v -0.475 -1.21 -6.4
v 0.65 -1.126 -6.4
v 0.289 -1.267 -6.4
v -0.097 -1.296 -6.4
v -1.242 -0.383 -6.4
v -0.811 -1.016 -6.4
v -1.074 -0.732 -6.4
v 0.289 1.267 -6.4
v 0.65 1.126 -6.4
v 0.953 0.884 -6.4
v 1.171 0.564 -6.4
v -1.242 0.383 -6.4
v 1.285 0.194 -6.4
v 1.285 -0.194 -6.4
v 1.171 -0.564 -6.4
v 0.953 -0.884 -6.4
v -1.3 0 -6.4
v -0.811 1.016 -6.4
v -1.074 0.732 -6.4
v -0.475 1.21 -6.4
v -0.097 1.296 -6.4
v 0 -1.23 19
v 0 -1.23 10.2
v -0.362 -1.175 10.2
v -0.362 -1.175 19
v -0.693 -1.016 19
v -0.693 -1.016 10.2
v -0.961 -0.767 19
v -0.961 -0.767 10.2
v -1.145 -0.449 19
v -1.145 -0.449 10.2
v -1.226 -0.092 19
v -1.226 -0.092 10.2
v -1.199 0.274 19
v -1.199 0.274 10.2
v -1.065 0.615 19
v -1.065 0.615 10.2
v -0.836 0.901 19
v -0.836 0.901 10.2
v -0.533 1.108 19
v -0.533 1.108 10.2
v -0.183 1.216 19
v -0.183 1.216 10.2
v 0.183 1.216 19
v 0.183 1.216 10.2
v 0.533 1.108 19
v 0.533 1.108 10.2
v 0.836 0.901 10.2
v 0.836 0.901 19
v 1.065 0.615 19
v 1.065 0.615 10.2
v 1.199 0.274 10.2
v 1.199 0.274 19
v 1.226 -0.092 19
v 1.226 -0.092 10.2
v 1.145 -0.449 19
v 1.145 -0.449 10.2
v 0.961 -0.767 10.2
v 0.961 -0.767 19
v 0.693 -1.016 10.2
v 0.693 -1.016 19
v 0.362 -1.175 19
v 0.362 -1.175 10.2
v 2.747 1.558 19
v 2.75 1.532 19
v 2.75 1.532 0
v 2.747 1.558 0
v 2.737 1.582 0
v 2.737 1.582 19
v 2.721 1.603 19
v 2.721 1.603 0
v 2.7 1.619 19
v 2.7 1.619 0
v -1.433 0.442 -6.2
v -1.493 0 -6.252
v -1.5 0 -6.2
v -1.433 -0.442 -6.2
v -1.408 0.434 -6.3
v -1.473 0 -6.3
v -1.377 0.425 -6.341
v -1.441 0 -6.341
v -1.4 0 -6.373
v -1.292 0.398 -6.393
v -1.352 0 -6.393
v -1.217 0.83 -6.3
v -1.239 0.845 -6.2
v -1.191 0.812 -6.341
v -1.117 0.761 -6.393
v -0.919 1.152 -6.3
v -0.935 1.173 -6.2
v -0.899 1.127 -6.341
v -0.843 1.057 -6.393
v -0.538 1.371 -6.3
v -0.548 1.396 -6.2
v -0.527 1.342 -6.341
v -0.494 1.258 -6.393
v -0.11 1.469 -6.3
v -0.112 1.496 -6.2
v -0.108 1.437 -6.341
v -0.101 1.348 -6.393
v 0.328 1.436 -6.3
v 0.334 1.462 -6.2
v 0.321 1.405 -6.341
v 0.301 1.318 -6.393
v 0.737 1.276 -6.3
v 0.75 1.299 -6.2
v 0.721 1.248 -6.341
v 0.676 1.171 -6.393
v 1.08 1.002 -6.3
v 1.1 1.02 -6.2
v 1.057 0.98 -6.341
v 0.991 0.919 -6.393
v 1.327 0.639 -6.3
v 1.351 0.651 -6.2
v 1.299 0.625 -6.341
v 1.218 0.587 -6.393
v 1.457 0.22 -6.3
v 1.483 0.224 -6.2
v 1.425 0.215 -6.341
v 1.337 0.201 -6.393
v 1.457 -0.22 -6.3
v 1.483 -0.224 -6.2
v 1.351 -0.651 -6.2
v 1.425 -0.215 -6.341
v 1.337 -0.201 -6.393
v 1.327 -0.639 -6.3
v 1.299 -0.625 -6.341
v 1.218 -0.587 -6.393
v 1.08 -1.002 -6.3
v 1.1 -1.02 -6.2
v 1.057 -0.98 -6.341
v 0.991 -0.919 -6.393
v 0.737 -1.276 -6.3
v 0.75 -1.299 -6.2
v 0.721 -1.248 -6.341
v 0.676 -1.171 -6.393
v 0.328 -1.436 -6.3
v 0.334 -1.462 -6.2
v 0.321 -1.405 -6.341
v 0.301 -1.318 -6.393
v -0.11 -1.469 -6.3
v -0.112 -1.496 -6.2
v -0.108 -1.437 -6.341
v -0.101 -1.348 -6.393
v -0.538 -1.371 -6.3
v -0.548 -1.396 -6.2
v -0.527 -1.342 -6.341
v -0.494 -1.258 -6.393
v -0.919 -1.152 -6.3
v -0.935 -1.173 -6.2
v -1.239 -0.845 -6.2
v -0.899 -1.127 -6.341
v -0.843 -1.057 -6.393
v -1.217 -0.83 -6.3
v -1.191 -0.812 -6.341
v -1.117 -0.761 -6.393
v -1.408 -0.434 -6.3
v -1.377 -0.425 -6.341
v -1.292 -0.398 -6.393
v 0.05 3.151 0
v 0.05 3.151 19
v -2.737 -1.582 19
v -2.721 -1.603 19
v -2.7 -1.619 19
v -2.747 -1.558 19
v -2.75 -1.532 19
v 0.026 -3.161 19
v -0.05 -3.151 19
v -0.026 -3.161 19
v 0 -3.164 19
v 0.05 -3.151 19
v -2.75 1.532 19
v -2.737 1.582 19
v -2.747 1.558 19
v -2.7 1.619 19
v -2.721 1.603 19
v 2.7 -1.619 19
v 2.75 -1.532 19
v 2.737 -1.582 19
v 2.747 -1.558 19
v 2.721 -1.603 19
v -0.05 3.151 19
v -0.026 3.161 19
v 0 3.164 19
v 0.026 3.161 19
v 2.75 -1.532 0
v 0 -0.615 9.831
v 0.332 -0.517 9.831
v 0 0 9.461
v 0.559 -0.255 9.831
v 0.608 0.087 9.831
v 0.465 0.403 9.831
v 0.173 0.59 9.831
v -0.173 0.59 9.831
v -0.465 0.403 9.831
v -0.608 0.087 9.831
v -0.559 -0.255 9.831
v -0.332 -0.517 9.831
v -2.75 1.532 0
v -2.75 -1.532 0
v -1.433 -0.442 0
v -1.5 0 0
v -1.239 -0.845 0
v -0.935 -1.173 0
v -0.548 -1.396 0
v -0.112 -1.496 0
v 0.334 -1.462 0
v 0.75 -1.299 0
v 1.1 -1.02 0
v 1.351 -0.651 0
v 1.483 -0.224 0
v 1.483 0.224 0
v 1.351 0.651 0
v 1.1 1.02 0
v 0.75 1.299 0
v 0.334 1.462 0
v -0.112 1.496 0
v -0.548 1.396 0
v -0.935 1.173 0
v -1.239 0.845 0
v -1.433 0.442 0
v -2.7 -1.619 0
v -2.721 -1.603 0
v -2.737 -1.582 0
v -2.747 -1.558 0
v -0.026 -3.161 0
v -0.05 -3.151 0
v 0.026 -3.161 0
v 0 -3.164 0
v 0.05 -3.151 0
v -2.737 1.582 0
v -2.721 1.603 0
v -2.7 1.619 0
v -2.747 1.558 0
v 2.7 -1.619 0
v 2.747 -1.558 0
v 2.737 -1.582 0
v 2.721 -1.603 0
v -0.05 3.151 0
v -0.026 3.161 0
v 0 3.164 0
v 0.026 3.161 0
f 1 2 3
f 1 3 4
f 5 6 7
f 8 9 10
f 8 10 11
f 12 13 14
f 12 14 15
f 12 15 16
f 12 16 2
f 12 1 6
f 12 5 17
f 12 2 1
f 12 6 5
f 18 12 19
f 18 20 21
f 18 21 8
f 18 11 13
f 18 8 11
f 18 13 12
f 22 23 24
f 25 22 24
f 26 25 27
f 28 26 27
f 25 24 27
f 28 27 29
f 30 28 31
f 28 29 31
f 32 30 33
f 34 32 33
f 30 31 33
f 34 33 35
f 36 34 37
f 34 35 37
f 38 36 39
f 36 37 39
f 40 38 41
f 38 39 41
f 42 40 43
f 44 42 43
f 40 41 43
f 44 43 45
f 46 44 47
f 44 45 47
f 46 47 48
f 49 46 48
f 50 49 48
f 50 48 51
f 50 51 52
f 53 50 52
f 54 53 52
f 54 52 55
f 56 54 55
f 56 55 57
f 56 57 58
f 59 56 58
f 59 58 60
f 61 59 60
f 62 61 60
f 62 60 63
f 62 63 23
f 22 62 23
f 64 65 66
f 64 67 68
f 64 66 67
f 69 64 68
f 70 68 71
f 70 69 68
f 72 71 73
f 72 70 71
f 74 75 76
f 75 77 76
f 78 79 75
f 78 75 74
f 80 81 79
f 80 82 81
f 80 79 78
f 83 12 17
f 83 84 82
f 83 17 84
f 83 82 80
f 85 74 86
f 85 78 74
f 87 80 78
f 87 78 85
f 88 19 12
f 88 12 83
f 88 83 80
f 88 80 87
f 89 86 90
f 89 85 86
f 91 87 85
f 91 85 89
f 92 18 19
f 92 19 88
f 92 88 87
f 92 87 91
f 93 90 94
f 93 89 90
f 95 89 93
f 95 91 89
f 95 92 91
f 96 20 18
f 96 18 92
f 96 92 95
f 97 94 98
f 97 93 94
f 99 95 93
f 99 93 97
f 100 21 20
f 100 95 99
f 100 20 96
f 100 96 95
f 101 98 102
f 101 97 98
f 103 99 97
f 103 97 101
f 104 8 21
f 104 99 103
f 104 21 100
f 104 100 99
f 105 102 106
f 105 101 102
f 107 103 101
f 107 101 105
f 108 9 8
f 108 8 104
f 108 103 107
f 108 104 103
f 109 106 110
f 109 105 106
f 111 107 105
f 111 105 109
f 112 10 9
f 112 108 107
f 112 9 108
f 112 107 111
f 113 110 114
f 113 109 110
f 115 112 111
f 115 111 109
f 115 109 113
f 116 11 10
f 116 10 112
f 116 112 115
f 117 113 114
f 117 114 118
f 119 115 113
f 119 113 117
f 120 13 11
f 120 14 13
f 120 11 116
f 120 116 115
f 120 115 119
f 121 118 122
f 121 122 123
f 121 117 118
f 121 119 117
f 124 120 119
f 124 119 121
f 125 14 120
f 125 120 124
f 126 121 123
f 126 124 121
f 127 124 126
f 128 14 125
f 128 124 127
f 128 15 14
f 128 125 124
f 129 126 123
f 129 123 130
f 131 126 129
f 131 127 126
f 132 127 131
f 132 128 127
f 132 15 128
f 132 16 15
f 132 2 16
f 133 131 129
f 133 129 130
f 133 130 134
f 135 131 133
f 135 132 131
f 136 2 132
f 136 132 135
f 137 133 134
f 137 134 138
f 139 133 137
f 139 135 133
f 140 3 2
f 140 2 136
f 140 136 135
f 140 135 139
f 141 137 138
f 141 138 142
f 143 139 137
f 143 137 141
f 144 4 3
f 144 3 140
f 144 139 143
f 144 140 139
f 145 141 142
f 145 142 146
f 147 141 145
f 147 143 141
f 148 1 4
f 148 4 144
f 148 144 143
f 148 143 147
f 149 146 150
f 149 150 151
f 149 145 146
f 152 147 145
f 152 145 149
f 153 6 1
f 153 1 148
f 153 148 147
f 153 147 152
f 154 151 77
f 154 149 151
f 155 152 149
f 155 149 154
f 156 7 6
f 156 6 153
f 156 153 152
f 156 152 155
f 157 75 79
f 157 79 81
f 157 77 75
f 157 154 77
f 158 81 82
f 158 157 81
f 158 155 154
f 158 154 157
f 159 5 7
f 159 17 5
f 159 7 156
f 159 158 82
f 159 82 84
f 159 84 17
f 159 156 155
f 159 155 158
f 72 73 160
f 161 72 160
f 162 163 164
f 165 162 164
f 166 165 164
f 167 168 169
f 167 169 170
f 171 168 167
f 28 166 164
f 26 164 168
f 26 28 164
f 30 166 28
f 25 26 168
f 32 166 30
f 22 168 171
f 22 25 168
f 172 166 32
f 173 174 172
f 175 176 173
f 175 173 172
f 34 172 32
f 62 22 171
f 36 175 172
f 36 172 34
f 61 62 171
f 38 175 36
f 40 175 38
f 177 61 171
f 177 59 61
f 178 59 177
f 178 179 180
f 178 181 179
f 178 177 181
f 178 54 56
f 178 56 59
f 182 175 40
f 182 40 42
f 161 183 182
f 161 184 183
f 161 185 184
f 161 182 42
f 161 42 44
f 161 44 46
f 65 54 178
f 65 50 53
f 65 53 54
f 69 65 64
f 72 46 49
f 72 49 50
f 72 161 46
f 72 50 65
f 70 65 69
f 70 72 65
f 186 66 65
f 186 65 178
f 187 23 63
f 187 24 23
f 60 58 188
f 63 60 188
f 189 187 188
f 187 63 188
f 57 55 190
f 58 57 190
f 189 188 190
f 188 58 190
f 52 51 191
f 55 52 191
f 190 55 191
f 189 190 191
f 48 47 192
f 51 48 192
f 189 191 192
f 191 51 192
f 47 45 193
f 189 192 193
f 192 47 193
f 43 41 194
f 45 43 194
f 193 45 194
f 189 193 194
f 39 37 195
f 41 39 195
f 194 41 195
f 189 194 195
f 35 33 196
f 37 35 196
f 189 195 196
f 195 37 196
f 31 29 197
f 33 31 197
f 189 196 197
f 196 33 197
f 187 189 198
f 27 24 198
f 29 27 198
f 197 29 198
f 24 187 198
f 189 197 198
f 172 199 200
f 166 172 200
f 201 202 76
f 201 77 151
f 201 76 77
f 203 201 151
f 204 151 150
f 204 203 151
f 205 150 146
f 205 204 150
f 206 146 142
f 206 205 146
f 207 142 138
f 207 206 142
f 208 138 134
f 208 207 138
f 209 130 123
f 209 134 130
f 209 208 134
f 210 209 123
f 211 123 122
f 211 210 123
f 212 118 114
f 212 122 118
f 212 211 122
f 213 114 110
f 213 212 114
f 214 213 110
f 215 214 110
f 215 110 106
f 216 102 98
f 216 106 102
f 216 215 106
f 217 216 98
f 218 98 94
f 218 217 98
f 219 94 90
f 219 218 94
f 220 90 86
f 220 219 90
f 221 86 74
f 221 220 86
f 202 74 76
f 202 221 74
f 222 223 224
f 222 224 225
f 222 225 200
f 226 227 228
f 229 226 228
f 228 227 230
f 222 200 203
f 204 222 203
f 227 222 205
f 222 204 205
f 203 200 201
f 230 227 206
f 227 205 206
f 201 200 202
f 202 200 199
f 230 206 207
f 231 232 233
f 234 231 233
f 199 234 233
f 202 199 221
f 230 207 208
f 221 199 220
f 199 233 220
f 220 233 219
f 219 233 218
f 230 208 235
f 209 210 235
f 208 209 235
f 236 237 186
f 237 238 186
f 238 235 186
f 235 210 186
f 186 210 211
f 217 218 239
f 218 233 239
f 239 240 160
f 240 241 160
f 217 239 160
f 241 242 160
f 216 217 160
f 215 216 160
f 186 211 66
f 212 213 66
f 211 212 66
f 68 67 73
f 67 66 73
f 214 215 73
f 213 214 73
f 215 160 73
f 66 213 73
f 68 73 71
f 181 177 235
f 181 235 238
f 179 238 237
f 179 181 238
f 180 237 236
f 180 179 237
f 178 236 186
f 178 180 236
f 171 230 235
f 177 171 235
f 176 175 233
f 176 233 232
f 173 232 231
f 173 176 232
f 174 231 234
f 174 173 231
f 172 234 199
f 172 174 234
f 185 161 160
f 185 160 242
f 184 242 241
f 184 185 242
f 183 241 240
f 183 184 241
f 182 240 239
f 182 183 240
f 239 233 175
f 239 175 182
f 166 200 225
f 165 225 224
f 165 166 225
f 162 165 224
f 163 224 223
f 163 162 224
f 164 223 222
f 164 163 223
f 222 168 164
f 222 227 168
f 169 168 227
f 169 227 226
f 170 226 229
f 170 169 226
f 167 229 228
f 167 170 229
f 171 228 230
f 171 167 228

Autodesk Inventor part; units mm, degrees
ref_plane "YZ Plane" through (0, 0, 0) normal (1, 0, 0) x (0, 1, 0)
ref_plane "XZ Plane" through (0, 0, 0) normal (0, 1, 0) x (-1, 0, 0)
ref_plane "XY Plane" through (0, 0, 0) normal (0, 0, 1) x (1, 0, 0)
sketch "Sketch1" plane through (0, 0, 0) normal (0, 0, 1) x (1, 0, 0)
  line L0 (-2.75, 1.59) -> (0, 3.18)
  line L1 (0, -3.18) -> (-2.75, -1.59)
  line L2 (-2.75, 1.59) -> (-2.75, -1.59)
  line L3 (2.75, 1.59) -> (0, 3.18)
  line L4 (0, -3.18) -> (2.75, -1.59)
  line L5 (2.75, 1.59) -> (2.75, -1.59)
  point P0 (0, 0)
extrude "Extrusion1" add sketch "Sketch1" along normal blind 19
sketch "Sketch2" plane through (0, 0, 19) normal (0, 0, 1) x (1, 0, 0)
  circle A0 centre (0, 0) radius 1.5
  dimension "d20" = 3
hole "Hole1" at (0, 0, 19) direction (0, 0, -1) diameter 2.459 depth 8.8 tip angle 118 thread size "M3x0.5" class "6H" standard "ISO Metric profile"
fillet "Fillet1" radius 0.1 6 edges at (0, 3.18, 9.5) (2.75, 1.59, 9.5) (-2.75, 1.59, 9.5) (2.75, -1.59, 9.5) (0, -3.18, 9.5) (-2.75, -1.59, 9.5)
sketch "Sketch4" plane through (0, 0, 0) normal (0, 0, -1) x (-1, 0, 0)
  circle A0 centre (0, 0) radius 1.5
  dimension "d29" = 3
extrude "Extrusion2" add sketch "Sketch4" along normal blind 6.4
thread "Thread1" size "M3x0.5" class "6g" standard "ANSI Metric M Profile" length 9.967
fillet "Fillet2" radius 0.2 1 edges at (1.5, 0, -6.4)
properties part number "spacer" material "Steel, Mild"
